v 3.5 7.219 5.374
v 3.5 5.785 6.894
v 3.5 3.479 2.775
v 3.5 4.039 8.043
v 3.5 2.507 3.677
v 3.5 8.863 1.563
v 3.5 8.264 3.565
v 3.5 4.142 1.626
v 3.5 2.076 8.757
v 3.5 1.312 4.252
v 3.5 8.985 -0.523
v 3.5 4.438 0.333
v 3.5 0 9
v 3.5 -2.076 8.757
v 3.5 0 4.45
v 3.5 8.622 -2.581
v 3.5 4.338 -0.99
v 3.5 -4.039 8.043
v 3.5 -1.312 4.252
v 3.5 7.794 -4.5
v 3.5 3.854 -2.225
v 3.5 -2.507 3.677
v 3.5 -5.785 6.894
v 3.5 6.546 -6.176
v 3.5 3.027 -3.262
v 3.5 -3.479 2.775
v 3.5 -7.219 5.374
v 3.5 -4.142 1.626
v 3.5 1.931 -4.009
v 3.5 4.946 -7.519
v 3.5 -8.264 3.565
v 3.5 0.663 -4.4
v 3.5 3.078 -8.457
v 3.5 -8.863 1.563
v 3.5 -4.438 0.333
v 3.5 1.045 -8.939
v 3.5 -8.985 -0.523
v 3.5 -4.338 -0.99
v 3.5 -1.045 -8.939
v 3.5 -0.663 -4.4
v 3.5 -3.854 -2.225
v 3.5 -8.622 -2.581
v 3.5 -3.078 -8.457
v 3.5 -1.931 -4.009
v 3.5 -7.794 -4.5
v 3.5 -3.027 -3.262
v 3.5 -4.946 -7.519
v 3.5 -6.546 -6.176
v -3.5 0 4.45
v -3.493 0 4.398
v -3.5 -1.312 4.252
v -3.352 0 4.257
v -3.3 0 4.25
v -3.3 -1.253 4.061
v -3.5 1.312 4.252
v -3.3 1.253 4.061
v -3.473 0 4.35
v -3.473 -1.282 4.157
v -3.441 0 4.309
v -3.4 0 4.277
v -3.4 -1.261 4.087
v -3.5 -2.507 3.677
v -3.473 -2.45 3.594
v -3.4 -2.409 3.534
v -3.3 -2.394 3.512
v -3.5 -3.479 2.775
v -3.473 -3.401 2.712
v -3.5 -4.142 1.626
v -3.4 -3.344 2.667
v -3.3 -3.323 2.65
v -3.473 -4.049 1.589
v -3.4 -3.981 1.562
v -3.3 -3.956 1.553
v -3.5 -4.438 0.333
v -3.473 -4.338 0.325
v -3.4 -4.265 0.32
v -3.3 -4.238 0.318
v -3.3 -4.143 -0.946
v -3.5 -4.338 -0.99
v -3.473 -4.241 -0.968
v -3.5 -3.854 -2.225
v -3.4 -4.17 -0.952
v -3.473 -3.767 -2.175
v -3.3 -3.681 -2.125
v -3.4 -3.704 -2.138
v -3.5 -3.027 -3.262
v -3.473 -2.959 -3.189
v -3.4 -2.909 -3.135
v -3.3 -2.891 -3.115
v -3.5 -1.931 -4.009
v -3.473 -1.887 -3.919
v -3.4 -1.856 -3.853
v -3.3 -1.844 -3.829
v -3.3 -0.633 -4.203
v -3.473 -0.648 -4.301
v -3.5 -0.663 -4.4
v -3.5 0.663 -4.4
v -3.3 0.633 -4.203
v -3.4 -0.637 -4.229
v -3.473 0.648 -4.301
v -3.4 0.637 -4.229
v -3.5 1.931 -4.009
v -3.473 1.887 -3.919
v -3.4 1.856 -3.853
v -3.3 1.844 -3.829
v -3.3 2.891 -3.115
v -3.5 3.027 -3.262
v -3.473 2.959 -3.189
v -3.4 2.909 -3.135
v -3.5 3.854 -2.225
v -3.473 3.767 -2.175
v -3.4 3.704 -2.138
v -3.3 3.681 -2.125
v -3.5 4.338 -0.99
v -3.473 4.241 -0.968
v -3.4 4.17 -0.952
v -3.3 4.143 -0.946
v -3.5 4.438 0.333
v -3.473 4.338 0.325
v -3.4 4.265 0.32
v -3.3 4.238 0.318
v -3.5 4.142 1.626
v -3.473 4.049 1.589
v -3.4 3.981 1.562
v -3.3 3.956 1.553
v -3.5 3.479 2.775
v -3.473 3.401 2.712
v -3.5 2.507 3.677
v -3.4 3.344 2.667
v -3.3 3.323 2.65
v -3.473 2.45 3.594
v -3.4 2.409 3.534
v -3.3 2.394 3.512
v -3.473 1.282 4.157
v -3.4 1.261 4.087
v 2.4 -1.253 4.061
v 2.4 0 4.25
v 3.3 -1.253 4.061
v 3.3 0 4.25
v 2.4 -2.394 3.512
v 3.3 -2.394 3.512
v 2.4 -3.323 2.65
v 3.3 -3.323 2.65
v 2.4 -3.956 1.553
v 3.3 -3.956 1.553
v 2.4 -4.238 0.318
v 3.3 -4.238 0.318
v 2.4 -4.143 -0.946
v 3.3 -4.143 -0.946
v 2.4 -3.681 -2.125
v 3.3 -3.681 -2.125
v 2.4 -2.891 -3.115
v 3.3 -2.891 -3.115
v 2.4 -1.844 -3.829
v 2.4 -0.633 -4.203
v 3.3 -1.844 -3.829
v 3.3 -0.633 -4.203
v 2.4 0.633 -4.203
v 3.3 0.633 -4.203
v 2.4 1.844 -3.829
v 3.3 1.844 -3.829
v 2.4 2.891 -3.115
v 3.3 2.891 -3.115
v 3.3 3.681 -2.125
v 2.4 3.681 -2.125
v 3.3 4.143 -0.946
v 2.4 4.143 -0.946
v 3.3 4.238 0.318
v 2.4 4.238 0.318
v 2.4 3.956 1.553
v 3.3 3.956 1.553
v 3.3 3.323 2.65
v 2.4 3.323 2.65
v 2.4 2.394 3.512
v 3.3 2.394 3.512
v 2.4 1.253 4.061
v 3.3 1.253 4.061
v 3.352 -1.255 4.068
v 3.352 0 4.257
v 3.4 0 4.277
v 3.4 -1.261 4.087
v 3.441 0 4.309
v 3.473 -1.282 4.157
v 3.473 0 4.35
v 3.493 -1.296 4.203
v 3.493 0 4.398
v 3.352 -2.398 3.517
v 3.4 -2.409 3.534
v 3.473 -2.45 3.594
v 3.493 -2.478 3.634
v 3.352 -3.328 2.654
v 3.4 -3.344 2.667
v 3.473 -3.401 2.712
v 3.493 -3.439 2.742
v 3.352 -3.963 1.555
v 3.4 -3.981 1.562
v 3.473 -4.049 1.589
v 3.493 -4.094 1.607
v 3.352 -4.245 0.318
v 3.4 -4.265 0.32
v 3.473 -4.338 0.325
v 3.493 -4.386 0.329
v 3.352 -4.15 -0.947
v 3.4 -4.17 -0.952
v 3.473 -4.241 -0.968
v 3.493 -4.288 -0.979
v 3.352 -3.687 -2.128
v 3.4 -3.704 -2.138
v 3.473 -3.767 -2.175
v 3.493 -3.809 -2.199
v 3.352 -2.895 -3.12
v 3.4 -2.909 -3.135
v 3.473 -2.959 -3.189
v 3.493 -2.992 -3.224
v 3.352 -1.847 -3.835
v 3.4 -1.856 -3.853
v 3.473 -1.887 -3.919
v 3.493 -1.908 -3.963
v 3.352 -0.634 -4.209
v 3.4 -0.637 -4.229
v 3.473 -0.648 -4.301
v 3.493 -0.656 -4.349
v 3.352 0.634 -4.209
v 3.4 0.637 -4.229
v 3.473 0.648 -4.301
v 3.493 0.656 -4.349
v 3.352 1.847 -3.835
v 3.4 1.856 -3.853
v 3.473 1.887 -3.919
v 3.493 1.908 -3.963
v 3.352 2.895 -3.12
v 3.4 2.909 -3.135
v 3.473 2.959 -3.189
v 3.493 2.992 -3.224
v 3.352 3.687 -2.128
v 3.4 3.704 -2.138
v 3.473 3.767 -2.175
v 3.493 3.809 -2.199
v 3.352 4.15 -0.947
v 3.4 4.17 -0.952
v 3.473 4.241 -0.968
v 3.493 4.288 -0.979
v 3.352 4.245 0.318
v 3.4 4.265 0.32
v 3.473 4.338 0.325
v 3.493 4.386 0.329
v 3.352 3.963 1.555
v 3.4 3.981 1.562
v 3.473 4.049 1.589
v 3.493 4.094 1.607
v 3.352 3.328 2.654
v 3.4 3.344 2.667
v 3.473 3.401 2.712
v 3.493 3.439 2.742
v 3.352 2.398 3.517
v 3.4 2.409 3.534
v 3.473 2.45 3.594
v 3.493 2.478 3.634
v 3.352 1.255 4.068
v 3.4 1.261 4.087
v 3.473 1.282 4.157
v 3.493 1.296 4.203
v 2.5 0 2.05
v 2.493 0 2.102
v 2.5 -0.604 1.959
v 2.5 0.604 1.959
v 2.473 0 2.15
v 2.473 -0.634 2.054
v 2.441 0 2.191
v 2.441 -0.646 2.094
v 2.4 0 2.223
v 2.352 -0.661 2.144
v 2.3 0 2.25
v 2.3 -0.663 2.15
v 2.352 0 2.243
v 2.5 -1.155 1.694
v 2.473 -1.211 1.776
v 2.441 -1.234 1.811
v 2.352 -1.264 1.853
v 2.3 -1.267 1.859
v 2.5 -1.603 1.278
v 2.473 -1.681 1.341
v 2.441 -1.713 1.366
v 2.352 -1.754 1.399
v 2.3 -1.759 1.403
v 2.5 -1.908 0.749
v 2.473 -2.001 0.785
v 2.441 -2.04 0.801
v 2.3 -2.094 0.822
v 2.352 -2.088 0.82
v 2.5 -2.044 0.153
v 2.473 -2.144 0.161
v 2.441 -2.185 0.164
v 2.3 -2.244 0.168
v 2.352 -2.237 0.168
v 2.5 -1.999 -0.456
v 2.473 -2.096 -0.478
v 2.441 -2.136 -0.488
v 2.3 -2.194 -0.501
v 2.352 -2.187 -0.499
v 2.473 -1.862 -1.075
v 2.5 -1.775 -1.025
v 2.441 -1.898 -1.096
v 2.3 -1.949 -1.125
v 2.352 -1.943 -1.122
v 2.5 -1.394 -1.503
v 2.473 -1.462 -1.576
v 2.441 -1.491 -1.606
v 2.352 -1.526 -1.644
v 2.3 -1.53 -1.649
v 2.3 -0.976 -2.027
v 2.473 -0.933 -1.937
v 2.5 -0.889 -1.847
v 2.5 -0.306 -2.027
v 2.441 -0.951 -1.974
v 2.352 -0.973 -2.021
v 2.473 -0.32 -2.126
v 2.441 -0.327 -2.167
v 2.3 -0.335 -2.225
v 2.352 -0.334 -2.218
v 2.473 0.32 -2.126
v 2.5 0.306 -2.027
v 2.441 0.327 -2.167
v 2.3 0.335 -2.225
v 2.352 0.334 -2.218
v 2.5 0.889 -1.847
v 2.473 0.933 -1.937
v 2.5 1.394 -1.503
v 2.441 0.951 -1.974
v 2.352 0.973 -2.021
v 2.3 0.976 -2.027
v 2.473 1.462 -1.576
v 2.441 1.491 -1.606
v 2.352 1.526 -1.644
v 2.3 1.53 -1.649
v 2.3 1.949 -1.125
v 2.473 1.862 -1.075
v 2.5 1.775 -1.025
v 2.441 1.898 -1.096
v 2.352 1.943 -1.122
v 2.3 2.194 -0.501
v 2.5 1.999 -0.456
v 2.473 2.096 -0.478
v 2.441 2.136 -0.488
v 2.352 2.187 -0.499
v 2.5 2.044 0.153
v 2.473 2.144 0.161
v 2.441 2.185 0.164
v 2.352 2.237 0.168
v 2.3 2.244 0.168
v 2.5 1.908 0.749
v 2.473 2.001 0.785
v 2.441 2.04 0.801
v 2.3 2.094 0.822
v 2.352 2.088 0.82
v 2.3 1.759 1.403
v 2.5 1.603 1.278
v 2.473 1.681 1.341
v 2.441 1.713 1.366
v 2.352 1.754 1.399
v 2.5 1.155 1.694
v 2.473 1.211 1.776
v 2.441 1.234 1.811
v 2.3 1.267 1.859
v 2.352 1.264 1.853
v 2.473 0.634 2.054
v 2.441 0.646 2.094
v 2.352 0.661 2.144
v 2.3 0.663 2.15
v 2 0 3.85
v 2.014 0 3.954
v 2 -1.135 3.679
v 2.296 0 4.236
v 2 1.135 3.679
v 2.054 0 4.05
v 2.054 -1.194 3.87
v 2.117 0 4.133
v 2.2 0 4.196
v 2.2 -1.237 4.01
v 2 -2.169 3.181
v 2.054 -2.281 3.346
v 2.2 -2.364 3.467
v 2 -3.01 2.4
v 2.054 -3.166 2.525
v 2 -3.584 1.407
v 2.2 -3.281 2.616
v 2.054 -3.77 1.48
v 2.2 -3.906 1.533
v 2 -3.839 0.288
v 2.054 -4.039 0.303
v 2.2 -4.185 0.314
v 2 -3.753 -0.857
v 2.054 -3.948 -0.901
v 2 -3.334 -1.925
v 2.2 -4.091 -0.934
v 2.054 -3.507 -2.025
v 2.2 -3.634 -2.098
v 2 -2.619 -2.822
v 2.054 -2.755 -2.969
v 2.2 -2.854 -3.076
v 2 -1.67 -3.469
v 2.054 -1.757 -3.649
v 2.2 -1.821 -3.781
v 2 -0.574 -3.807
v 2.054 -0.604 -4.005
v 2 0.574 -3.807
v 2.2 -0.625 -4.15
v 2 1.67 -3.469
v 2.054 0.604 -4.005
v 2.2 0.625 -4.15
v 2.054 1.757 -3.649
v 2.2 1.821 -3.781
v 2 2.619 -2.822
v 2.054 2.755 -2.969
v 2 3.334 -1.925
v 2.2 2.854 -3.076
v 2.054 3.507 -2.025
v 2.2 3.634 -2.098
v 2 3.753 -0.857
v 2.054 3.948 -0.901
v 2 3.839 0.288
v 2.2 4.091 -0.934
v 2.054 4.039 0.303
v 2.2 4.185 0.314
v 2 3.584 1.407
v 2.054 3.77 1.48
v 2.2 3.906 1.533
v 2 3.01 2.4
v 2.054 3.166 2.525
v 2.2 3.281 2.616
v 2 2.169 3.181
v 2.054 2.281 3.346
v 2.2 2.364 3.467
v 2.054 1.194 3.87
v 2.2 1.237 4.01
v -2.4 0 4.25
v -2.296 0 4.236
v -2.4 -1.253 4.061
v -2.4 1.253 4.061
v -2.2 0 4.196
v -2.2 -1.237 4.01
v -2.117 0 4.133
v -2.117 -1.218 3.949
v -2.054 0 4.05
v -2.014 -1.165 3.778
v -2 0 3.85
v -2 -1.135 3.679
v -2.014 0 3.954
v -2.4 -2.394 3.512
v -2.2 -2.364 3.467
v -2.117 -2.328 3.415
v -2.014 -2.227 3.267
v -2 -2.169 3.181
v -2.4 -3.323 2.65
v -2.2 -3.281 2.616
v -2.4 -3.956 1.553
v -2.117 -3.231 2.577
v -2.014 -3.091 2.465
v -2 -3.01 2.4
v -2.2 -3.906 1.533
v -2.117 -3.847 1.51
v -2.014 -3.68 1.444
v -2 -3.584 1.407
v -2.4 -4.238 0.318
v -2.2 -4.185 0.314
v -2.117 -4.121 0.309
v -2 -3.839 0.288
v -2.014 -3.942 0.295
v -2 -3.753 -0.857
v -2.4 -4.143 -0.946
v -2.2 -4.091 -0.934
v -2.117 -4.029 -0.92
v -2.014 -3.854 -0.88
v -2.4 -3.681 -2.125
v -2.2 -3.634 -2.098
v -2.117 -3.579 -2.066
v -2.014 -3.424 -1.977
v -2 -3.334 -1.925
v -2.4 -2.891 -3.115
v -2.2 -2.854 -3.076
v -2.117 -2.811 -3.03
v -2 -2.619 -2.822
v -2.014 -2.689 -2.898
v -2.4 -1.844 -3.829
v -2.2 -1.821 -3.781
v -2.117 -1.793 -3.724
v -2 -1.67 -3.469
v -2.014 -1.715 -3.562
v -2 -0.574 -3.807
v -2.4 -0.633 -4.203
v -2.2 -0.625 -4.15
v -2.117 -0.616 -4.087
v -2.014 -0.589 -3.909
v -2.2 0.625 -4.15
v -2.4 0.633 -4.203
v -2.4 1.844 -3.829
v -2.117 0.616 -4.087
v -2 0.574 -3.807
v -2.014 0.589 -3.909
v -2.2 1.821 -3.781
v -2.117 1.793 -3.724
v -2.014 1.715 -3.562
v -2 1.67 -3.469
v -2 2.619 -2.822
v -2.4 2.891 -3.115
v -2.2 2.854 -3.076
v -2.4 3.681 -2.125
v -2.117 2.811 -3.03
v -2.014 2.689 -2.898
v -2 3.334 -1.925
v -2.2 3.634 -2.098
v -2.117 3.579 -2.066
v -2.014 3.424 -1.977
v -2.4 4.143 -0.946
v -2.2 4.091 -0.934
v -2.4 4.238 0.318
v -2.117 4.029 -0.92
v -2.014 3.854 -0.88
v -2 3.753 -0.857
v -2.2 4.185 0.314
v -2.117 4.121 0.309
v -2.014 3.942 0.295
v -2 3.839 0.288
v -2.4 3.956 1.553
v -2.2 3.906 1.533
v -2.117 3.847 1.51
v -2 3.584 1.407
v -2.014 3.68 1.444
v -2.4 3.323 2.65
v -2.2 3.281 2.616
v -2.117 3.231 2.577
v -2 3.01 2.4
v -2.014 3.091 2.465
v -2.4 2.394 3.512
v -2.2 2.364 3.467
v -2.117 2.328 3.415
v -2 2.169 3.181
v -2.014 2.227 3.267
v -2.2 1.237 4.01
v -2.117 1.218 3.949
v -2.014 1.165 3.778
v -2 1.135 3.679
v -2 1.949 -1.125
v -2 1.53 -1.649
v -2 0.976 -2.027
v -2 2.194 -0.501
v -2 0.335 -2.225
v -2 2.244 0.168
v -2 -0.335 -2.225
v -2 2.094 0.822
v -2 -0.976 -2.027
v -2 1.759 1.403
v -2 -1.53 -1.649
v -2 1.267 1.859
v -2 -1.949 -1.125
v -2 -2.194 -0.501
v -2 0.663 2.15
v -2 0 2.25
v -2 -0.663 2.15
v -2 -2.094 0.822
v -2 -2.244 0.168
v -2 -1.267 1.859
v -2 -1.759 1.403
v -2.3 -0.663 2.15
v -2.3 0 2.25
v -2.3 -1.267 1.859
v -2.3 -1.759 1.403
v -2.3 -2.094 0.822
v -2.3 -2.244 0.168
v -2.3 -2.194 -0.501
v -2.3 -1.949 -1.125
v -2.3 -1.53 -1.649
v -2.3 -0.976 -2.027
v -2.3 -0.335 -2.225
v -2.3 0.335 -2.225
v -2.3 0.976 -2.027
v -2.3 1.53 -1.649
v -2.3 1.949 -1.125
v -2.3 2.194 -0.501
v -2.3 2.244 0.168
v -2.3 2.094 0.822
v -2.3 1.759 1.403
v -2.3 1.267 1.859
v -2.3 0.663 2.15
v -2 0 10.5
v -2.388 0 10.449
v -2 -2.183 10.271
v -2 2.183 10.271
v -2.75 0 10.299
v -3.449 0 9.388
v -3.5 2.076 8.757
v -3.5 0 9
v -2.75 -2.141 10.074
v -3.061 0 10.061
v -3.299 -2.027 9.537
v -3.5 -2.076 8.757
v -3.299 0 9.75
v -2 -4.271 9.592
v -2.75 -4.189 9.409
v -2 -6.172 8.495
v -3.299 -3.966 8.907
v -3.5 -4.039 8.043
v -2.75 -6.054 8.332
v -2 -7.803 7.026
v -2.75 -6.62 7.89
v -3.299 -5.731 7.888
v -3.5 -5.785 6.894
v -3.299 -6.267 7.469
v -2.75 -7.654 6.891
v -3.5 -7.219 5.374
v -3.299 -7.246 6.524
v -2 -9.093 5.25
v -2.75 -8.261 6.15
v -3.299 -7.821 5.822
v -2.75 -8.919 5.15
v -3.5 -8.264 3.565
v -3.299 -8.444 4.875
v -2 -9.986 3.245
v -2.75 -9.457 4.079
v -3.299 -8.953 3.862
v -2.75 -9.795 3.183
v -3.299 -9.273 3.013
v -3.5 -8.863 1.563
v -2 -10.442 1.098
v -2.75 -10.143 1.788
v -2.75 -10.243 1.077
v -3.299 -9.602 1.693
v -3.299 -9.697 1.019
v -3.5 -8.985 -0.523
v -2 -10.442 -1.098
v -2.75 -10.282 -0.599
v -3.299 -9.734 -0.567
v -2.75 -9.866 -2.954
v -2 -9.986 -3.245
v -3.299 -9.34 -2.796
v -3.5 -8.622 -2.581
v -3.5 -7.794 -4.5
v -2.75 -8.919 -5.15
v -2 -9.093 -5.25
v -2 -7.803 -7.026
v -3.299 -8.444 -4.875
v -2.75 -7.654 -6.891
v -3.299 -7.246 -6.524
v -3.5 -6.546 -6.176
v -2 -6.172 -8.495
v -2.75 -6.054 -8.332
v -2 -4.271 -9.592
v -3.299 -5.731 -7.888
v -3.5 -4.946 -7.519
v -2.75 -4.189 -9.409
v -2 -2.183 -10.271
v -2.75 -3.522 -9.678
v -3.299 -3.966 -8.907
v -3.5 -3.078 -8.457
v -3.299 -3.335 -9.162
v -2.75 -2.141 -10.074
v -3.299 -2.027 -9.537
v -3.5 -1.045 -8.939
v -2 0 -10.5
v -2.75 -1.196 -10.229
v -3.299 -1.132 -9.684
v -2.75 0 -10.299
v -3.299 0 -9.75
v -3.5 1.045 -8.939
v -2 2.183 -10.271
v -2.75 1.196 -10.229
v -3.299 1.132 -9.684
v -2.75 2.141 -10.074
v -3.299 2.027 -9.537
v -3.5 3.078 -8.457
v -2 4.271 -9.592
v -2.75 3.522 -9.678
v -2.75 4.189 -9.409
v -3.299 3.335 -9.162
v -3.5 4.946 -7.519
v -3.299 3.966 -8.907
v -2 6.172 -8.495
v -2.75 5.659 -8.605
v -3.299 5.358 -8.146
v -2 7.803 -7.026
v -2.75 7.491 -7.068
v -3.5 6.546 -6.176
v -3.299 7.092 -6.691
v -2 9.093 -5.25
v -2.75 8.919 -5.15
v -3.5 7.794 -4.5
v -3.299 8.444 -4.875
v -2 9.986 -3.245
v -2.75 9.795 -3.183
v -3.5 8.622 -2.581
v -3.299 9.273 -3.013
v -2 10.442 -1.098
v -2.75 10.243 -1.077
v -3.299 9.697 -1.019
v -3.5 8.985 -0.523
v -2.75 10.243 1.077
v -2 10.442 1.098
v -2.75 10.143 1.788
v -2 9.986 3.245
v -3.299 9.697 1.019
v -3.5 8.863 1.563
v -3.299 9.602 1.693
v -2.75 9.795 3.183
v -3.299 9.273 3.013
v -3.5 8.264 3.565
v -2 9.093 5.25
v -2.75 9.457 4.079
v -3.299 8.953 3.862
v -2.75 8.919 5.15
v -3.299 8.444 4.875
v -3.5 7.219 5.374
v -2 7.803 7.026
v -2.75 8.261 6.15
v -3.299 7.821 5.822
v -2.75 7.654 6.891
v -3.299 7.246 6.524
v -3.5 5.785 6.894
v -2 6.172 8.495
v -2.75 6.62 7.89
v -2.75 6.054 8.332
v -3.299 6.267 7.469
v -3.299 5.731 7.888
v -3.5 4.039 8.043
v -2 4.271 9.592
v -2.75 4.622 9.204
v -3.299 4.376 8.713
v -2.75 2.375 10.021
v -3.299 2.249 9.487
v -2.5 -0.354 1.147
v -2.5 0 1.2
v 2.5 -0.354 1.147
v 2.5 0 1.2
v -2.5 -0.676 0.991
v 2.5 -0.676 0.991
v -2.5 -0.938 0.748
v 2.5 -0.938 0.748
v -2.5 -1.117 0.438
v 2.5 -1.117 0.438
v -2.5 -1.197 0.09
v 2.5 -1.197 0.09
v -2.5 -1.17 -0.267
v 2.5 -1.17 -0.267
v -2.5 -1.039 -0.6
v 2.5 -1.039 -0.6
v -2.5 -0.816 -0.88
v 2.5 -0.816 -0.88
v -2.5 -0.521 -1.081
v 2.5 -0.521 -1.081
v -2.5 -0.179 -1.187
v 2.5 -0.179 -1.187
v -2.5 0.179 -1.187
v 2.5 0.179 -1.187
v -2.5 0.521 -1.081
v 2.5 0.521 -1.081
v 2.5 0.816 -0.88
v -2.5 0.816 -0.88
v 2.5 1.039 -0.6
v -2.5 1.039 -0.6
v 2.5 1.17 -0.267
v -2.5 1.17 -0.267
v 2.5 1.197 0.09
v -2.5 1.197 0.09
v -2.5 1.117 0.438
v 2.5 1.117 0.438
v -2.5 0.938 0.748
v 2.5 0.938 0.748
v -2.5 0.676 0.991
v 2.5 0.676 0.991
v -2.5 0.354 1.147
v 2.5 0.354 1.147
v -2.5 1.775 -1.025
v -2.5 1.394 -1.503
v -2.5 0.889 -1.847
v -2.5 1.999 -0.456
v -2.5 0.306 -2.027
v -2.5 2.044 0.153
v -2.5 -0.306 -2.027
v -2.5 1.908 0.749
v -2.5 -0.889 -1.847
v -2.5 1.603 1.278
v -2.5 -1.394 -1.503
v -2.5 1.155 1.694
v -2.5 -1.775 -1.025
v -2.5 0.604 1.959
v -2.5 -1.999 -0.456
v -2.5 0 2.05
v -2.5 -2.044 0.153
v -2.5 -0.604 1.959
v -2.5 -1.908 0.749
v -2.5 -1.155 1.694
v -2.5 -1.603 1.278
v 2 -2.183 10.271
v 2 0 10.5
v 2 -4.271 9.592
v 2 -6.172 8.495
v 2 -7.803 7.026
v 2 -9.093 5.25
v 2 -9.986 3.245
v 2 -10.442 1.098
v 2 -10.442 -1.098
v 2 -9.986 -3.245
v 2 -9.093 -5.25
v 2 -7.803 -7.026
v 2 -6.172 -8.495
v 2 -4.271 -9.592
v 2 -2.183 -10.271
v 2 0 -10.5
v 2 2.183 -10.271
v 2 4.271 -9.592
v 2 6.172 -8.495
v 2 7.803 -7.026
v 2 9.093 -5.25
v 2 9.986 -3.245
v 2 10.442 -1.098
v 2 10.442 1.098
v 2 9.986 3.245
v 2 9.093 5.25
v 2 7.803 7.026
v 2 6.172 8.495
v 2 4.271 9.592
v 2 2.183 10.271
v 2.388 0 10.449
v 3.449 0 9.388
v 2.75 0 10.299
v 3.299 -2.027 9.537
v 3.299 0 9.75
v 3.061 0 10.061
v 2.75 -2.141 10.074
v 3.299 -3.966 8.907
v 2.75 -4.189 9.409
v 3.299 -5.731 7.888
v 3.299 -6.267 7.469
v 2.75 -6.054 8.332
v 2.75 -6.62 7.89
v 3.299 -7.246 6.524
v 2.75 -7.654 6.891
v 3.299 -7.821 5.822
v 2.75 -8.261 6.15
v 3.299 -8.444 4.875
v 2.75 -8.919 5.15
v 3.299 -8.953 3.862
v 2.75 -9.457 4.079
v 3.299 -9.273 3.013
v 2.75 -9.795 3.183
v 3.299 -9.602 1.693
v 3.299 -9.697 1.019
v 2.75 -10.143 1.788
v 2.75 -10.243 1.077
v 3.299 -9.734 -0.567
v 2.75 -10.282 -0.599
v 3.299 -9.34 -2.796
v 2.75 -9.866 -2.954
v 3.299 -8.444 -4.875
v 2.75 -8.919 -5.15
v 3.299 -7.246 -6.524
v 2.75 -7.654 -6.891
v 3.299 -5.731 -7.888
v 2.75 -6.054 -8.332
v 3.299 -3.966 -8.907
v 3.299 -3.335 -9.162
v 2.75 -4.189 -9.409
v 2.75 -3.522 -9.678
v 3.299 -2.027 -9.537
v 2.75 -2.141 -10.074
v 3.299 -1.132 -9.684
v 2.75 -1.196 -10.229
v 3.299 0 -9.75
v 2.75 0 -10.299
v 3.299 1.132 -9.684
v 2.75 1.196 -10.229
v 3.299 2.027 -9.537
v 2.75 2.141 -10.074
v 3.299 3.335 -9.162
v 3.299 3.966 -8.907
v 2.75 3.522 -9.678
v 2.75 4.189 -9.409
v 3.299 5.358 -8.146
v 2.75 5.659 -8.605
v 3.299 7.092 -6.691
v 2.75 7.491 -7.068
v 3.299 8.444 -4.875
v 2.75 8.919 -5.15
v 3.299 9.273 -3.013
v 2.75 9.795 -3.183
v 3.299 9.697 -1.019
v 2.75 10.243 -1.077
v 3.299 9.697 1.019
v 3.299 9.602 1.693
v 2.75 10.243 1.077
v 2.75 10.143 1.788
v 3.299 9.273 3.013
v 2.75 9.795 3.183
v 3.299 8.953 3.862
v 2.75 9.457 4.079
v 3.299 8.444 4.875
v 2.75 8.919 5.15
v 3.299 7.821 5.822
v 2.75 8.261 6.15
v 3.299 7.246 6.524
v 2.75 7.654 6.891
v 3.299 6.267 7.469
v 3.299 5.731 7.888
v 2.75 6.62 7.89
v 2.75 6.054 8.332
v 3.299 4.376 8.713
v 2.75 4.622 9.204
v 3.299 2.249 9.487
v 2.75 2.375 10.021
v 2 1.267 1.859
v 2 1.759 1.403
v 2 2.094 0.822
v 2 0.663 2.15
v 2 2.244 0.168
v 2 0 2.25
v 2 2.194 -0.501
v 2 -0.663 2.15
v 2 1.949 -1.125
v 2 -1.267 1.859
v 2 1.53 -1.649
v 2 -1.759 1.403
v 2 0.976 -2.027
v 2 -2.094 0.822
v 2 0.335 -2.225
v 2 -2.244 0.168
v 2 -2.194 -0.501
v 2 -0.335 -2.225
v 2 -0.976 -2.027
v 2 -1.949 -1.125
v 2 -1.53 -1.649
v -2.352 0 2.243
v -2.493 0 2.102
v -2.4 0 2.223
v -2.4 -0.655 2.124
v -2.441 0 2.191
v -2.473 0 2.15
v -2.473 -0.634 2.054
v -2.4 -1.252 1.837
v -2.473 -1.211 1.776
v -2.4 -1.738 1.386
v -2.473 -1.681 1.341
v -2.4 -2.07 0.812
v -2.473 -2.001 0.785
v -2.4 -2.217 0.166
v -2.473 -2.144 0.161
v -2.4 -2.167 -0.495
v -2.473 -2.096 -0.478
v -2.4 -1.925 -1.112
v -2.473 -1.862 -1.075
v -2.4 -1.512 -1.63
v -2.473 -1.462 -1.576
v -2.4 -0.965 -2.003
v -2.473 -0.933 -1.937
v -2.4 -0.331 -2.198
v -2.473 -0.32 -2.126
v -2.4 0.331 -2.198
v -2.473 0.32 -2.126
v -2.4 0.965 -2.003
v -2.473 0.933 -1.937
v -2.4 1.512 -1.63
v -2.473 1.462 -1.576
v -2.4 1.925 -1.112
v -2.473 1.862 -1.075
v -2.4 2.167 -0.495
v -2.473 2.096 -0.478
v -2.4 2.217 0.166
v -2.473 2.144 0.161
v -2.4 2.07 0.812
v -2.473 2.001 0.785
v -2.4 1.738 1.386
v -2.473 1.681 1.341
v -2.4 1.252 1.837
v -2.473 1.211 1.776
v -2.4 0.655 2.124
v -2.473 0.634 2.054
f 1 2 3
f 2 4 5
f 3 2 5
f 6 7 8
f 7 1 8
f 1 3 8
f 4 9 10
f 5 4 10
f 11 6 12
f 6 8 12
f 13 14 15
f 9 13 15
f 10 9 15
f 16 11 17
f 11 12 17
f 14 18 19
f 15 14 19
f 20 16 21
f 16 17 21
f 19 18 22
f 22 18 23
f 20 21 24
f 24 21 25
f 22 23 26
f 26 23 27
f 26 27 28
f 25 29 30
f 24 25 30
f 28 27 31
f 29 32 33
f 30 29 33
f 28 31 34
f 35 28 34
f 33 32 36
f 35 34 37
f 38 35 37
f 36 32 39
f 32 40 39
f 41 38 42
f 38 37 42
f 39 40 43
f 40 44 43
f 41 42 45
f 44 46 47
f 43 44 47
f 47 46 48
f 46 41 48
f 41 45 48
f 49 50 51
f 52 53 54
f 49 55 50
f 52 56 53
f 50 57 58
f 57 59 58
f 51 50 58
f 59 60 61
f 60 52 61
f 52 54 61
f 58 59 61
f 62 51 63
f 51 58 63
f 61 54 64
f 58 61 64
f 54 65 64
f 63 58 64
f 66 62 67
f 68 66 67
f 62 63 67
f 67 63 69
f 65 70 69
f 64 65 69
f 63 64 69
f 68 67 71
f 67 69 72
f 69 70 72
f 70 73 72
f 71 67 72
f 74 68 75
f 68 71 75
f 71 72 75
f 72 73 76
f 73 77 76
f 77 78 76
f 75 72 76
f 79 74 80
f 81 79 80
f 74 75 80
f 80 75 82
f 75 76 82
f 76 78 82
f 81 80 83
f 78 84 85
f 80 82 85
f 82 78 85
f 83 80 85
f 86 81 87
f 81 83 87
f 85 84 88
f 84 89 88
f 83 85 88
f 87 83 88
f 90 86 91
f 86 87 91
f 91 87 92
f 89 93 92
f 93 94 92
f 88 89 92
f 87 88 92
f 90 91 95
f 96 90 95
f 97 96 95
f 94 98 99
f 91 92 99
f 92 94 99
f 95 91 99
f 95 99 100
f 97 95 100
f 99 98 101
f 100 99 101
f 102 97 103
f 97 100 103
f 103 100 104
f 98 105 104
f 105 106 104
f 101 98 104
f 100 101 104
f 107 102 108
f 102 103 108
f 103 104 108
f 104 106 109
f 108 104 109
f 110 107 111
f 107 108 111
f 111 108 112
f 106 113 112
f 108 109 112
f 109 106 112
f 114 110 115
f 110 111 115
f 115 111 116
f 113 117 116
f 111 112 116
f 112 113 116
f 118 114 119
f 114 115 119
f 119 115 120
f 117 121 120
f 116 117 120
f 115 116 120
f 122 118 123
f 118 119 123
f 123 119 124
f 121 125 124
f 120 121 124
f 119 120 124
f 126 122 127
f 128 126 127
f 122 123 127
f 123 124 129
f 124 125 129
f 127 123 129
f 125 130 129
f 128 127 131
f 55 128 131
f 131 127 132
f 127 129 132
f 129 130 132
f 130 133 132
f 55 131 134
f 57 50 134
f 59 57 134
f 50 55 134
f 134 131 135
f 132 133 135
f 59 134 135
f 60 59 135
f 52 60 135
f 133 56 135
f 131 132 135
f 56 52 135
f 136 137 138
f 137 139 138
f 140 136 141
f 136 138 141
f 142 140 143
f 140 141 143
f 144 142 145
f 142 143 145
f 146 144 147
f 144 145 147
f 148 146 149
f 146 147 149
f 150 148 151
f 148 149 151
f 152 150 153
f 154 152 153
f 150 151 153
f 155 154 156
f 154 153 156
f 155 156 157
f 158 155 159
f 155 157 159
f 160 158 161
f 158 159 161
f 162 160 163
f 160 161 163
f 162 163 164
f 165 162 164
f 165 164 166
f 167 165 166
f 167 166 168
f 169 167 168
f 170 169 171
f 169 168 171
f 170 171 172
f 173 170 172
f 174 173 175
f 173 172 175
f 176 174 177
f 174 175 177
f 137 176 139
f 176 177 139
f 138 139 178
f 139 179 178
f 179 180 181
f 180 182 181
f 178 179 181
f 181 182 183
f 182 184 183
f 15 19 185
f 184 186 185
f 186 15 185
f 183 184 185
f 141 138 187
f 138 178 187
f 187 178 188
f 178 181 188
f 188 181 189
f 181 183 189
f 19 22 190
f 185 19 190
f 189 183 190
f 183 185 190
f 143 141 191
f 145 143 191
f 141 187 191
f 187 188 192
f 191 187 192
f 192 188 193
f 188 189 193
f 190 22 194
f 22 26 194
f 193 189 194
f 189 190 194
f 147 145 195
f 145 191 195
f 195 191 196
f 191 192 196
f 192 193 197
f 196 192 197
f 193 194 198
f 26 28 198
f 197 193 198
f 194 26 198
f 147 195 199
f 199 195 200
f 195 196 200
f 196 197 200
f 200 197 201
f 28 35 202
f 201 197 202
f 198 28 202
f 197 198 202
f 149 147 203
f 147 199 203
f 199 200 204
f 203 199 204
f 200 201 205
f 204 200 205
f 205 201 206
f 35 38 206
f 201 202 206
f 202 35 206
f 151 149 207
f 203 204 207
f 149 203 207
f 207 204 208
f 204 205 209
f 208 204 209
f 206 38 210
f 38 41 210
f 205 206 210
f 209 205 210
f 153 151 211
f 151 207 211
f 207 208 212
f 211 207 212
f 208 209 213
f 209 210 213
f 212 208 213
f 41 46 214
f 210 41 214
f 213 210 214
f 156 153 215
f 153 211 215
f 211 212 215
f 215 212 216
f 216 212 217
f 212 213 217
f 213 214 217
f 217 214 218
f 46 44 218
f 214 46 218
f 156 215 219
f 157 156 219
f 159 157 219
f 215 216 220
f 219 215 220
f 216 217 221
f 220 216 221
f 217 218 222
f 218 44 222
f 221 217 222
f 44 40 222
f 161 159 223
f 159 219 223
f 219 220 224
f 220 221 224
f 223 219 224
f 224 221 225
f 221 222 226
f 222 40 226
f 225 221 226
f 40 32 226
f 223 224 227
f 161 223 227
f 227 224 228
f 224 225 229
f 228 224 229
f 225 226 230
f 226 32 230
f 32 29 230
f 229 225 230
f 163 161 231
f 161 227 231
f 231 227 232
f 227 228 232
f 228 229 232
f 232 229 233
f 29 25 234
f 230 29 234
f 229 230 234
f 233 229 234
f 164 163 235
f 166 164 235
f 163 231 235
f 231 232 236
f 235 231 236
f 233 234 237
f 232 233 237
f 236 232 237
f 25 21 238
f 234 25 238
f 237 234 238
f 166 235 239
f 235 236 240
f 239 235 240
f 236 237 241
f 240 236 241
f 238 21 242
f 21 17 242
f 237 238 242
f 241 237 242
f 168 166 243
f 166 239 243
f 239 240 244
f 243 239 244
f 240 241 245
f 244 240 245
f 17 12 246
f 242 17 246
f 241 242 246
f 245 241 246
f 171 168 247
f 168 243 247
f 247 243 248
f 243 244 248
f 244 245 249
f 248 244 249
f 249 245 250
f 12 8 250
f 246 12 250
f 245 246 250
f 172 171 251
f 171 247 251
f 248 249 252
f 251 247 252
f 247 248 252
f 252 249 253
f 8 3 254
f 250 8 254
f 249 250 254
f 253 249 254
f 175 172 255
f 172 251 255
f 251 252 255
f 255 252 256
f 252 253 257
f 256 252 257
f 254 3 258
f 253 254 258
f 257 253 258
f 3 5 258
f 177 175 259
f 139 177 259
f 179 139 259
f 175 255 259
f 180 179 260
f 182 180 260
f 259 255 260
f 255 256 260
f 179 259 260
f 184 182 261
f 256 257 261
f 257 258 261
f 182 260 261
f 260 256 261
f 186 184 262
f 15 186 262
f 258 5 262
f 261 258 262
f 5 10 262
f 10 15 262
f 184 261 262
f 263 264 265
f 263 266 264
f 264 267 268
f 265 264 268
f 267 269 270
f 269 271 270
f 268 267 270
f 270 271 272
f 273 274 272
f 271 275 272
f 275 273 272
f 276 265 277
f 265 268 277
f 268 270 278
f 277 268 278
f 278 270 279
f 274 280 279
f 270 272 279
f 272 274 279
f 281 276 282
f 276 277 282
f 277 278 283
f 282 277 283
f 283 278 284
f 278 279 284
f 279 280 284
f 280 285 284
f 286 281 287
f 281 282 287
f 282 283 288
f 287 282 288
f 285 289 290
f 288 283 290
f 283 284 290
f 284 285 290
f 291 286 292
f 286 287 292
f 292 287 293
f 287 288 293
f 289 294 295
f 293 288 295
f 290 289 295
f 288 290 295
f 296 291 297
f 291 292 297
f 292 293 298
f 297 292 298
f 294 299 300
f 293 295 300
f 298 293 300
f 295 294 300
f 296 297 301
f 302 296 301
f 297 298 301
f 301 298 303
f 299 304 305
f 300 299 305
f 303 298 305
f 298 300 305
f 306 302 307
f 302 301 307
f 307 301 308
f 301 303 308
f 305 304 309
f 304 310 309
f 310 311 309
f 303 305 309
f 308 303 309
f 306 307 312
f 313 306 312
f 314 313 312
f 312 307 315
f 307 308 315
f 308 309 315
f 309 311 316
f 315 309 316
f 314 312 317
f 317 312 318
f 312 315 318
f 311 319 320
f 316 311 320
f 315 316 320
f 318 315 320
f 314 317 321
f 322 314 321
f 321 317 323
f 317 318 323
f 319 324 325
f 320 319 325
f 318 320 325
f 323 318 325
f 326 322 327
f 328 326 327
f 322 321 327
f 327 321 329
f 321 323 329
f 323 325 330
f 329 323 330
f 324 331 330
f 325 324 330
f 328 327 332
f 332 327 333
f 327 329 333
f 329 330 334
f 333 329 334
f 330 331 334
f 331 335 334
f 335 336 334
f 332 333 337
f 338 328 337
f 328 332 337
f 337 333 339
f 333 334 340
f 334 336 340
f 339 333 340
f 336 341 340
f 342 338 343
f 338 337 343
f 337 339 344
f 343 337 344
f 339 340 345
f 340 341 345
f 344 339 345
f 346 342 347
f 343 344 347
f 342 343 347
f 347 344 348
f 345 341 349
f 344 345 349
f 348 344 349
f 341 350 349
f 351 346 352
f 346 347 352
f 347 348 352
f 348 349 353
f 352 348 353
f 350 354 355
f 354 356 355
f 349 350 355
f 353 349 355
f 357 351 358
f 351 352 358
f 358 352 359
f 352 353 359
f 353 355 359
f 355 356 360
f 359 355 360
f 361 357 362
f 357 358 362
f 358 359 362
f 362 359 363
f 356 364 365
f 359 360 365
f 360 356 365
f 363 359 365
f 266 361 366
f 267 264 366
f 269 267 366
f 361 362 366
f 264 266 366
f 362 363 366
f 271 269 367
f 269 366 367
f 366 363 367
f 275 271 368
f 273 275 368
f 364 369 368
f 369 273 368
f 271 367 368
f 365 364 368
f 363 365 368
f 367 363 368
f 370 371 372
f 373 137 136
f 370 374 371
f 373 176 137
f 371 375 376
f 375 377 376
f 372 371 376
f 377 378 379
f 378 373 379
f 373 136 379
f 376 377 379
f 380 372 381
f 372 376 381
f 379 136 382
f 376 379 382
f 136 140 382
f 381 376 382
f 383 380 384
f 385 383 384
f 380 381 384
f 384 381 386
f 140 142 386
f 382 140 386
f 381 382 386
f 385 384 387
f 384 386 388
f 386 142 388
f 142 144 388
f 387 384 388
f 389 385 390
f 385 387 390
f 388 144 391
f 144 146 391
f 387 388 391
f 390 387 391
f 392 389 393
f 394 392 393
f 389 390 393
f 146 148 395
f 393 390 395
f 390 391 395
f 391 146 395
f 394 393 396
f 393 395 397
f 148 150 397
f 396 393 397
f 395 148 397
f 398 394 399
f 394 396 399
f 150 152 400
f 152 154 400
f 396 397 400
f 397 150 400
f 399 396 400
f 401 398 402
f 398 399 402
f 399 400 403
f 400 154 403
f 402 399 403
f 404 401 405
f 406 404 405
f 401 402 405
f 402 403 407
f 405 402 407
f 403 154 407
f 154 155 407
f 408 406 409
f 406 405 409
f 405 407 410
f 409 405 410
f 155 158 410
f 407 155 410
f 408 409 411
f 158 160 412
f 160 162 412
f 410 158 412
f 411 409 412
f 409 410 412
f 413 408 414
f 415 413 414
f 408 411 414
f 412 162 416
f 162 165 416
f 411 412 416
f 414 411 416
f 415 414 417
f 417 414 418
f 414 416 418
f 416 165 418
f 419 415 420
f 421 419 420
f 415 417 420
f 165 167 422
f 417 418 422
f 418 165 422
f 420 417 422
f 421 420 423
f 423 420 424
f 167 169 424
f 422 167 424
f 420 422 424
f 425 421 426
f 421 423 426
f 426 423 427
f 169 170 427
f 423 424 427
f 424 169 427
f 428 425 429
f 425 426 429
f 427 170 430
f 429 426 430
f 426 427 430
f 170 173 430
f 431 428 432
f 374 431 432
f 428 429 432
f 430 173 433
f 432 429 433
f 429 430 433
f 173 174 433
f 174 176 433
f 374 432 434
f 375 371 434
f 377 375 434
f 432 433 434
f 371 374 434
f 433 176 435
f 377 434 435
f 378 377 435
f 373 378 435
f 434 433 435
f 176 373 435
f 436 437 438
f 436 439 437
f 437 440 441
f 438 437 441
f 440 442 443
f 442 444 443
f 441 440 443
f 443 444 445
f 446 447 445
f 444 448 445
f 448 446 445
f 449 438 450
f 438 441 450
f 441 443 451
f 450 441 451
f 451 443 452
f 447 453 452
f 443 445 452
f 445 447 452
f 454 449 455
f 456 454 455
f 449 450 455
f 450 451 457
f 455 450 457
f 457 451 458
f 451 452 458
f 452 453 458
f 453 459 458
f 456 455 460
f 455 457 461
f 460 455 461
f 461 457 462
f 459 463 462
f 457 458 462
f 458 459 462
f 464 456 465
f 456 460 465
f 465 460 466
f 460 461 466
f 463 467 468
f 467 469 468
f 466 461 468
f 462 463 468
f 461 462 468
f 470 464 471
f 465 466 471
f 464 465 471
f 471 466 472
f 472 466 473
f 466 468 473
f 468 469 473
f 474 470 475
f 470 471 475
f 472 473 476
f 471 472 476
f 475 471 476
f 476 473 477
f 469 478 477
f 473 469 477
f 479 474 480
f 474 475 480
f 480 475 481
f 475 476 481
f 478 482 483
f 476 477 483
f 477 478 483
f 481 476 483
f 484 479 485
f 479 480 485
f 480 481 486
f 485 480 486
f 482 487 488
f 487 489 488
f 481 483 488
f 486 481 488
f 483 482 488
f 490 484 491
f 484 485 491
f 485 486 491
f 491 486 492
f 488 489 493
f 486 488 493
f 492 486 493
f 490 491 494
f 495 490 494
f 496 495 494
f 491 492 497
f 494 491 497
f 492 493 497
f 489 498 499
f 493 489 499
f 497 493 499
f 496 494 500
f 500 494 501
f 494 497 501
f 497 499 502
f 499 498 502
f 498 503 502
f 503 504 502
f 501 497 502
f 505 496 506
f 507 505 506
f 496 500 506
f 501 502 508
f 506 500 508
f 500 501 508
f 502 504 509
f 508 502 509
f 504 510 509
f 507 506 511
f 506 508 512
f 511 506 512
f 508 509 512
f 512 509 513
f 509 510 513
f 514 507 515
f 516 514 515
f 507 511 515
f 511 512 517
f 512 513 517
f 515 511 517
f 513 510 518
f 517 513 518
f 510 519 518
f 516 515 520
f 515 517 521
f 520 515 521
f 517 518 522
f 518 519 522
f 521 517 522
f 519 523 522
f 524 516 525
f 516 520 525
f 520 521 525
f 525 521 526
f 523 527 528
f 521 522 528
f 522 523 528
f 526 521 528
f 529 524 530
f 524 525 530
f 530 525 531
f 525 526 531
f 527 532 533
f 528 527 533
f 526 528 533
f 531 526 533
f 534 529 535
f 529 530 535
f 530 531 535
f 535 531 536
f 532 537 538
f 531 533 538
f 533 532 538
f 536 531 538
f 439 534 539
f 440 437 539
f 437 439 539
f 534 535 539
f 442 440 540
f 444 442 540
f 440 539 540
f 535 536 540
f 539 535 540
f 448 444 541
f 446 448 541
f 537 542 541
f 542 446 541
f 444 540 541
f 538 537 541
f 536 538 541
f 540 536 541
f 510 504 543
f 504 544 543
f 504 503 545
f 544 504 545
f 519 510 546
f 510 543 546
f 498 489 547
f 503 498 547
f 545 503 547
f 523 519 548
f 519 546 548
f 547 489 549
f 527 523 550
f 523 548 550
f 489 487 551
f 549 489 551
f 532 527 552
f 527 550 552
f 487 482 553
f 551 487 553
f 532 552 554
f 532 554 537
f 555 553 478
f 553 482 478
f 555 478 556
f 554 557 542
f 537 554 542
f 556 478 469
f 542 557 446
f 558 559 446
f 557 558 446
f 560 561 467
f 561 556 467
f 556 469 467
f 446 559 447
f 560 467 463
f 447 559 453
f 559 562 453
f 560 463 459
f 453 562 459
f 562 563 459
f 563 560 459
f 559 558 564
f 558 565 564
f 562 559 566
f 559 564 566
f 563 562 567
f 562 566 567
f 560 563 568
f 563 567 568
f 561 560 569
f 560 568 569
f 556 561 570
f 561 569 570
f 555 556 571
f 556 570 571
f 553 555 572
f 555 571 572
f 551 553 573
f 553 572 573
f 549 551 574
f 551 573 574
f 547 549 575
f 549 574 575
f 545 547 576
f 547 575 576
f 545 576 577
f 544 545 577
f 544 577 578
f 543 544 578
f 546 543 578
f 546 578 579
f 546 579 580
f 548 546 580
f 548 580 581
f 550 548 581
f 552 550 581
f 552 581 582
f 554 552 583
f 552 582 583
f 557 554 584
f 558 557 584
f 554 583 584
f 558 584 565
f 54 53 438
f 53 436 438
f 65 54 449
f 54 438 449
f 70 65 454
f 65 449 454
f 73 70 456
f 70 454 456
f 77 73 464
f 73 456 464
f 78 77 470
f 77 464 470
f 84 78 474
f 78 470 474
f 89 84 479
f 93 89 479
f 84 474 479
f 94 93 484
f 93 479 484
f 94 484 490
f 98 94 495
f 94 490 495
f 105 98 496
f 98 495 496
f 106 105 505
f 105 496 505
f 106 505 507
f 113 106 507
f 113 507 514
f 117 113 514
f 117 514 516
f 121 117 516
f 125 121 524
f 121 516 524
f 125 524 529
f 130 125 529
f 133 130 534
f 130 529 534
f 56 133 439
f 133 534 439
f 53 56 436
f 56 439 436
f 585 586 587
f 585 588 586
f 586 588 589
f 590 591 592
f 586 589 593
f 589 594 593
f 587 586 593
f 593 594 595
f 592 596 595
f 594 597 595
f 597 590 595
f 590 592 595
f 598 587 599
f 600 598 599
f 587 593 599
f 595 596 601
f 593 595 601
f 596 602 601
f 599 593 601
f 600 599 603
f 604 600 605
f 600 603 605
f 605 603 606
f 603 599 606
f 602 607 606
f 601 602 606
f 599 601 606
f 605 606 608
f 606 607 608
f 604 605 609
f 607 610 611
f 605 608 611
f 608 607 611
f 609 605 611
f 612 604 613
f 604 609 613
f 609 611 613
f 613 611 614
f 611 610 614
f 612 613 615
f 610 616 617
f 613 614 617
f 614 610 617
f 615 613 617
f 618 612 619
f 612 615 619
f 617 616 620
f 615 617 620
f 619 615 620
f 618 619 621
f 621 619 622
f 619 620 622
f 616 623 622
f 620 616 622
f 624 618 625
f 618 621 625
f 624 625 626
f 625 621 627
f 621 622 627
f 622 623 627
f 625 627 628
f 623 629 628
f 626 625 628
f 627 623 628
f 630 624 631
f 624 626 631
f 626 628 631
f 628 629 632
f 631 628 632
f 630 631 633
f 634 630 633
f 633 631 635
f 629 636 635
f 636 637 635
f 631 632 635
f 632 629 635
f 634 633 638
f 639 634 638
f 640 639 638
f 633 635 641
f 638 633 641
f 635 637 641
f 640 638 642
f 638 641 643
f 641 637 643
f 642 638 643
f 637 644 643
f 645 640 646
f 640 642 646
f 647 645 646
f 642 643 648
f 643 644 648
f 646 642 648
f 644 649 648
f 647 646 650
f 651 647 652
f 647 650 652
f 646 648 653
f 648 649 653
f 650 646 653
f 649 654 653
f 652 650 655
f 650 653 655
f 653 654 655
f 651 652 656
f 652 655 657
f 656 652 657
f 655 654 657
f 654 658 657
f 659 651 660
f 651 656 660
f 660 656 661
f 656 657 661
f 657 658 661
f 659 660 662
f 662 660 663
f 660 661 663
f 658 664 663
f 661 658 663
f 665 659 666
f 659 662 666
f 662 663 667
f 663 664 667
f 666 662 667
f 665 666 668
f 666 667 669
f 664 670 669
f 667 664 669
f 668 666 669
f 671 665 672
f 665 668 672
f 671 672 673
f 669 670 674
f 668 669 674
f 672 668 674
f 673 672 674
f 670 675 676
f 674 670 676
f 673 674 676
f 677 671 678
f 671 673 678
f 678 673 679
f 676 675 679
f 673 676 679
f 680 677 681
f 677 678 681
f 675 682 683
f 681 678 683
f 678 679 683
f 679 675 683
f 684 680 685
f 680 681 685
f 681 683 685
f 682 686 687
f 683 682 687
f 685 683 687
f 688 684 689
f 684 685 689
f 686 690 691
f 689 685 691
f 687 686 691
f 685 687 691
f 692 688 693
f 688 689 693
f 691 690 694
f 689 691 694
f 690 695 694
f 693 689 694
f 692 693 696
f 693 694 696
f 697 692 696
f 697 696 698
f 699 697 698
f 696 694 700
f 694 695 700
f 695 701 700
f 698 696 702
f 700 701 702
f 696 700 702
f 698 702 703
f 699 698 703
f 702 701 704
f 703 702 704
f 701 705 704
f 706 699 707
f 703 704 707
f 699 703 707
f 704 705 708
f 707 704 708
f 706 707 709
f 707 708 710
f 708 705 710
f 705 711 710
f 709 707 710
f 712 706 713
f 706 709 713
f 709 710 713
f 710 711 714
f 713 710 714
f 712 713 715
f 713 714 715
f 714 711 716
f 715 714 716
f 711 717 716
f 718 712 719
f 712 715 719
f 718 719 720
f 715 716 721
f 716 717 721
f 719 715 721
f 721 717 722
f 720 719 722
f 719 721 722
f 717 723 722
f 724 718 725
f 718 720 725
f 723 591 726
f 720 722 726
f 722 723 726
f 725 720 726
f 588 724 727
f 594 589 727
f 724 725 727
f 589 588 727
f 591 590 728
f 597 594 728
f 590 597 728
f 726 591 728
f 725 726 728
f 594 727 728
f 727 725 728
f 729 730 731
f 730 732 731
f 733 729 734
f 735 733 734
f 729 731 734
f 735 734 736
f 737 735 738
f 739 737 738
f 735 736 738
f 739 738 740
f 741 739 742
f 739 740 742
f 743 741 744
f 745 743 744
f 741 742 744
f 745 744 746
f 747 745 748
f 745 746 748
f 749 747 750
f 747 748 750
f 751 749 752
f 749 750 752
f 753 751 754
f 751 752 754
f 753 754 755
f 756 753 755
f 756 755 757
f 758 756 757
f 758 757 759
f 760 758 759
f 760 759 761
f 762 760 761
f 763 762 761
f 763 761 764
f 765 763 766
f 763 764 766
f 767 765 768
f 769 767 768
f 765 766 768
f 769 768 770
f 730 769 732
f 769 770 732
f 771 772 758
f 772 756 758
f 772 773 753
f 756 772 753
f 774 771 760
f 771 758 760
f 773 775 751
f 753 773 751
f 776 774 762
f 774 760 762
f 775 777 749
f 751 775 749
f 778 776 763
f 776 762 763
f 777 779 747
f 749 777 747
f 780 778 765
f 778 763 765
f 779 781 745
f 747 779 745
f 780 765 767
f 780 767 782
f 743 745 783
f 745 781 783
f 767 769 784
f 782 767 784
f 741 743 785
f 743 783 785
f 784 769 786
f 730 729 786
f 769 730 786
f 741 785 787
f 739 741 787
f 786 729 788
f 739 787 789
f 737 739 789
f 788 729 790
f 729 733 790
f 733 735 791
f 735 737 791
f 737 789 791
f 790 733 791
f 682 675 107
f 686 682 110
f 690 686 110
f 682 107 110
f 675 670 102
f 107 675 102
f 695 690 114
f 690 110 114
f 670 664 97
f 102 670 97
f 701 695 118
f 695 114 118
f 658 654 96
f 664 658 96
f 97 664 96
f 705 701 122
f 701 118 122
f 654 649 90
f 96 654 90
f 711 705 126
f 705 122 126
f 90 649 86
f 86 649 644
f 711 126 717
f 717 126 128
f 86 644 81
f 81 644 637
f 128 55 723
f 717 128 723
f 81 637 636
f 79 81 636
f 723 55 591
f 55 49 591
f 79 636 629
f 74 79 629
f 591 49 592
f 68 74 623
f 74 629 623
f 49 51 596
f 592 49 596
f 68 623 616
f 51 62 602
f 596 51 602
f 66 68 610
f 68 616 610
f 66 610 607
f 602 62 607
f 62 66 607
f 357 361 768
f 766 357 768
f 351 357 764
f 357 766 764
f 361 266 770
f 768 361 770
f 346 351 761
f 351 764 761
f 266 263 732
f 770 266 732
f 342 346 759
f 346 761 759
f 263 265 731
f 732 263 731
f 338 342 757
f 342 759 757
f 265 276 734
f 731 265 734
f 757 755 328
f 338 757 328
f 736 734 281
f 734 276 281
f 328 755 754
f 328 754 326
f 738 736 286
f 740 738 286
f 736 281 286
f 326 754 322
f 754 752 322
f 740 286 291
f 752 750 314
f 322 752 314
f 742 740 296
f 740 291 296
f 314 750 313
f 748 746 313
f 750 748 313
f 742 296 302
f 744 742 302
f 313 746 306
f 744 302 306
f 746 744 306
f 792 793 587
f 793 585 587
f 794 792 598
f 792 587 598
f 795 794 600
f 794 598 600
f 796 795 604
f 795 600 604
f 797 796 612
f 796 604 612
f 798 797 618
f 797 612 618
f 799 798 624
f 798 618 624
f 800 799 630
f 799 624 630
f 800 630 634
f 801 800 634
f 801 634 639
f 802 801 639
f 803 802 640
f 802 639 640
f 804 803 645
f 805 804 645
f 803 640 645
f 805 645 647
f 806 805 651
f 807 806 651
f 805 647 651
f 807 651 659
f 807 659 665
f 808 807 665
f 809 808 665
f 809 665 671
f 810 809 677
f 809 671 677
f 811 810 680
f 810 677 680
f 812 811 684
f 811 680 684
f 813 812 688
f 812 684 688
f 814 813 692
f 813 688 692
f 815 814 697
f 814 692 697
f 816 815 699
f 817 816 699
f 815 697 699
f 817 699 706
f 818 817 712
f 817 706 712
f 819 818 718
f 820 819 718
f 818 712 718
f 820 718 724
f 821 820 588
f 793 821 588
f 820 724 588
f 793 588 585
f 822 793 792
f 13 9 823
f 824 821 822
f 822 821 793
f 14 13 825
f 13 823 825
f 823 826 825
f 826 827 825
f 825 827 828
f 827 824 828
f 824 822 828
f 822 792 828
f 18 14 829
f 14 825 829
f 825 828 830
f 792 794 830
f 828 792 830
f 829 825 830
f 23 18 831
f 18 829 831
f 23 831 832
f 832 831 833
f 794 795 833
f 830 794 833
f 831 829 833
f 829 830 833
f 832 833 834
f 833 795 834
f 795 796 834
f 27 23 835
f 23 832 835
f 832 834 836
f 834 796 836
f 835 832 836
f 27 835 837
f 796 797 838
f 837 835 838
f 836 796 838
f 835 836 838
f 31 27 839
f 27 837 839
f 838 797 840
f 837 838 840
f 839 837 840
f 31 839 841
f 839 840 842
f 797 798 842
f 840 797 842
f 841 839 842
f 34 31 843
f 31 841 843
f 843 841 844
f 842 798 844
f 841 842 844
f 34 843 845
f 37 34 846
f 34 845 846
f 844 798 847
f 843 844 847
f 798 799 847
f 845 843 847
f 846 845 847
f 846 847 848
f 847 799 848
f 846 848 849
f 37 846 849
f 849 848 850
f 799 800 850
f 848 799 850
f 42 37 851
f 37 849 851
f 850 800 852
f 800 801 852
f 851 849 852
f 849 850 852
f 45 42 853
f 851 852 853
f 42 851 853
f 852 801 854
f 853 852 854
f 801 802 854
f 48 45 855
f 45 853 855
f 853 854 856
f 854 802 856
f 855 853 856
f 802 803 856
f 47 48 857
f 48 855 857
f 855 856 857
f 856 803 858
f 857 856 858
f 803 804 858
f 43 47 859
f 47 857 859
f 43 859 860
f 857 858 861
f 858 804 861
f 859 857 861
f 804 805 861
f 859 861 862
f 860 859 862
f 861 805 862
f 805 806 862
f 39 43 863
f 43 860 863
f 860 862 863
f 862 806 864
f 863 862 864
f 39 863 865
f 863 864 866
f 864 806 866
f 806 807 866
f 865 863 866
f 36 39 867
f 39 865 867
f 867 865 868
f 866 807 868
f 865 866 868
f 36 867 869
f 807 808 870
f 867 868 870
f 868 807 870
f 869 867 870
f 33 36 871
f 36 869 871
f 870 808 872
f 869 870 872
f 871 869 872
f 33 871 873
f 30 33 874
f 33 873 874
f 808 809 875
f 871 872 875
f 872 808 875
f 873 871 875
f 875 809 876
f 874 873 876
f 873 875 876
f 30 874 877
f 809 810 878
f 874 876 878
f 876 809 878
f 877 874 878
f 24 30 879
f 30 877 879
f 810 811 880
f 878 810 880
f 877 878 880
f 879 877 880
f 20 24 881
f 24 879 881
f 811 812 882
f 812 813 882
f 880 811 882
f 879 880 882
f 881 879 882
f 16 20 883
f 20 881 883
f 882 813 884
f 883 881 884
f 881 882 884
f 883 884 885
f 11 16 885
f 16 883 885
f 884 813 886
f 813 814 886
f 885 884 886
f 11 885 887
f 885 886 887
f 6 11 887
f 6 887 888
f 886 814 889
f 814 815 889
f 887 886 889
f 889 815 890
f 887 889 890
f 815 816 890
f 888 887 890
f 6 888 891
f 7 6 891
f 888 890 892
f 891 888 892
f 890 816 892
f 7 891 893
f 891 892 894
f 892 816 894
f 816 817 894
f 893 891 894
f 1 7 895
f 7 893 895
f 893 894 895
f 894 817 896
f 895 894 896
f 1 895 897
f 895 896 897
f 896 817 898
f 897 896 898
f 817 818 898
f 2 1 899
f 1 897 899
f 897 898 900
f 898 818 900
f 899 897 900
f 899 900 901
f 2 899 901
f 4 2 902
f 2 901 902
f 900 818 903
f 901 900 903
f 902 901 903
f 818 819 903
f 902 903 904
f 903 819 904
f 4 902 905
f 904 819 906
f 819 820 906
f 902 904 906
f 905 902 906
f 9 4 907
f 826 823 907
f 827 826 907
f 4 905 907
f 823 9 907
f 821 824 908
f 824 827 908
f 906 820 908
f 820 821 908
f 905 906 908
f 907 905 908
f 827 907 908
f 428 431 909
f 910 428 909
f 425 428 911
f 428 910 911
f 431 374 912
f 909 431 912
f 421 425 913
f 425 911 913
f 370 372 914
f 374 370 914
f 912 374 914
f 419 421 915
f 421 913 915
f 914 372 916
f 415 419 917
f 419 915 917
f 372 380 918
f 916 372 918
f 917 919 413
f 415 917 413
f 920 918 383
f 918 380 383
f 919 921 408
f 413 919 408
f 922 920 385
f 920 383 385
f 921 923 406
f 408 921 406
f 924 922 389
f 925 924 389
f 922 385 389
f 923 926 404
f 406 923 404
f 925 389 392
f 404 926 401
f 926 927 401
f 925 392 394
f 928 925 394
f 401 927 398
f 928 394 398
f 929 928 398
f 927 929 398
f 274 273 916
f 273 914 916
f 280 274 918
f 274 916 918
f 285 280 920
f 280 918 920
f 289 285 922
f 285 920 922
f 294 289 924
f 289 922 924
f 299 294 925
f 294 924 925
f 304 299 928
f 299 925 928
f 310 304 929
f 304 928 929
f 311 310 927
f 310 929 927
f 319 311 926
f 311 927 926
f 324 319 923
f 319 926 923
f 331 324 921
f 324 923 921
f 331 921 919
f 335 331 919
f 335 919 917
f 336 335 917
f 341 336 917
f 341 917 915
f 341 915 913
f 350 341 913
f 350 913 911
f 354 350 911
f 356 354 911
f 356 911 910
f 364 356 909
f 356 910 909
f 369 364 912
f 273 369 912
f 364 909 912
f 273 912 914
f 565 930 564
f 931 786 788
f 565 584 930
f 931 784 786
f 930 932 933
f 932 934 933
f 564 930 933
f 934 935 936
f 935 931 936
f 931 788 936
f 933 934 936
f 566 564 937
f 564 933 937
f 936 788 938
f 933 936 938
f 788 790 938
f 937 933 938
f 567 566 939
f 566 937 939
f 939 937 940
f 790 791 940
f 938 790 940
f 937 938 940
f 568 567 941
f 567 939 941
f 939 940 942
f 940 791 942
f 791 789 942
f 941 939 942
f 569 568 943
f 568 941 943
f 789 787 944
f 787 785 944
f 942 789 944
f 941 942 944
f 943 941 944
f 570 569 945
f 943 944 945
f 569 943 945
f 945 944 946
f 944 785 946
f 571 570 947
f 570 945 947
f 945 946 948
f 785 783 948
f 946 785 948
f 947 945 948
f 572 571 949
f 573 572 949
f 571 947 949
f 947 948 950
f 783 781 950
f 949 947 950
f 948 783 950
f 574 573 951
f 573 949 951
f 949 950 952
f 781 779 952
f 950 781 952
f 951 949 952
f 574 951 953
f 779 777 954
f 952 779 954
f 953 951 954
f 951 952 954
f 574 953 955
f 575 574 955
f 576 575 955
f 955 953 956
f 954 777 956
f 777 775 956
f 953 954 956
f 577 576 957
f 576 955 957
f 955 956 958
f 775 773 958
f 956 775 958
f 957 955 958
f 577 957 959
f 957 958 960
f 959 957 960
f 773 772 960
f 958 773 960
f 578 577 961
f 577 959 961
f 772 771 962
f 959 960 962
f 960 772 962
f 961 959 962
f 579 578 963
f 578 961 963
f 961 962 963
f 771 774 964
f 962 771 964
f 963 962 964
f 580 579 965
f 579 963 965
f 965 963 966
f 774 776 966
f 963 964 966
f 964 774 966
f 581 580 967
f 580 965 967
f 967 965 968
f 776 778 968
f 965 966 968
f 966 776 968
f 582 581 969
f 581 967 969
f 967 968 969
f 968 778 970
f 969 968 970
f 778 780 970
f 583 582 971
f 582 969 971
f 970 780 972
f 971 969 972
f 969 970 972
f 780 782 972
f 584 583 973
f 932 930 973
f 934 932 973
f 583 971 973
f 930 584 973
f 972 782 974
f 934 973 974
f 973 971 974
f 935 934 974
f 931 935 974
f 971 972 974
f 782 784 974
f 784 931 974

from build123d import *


with BuildPart() as part:
    # Esboço6 → Revolução2 (revolve)
    with BuildSketch(Plane.XY, mode=Mode.PRIVATE) as revolu_o2_sk:
        with BuildLine():
            Line((2.5, 1.2), (2.5, 2.05))
            ThreePointArc((2.5, 2.05), (2.441421356, 2.191421356), (2.3, 2.25))
            Line((2.3, 2.25), (2, 2.25))
            Line((2, 2.25), (2, 3.85))
            ThreePointArc((2, 3.85), (2.117157288, 4.132842712), (2.4, 4.25))
            Line((2.4, 4.25), (3.3, 4.25))
            ThreePointArc((3.3, 4.25), (3.441421356, 4.308578644), (3.5, 4.45))
            Line((3.5, 4.45), (3.5, 9))
            ThreePointArc((3.5, 9), (3.060660172, 10.060660172), (2, 10.5))
            Line((2, 10.5), (-2, 10.5))
            ThreePointArc((-2, 10.5), (-3.060660172, 10.060660172), (-3.5, 9))
            Line((-3.5, 9), (-3.5, 4.45))
            ThreePointArc((-3.5, 4.45), (-3.441421356, 4.308578644), (-3.3, 4.25))
            Line((-3.3, 4.25), (-2.4, 4.25))
            ThreePointArc((-2.4, 4.25), (-2.117157288, 4.132842712), (-2, 3.85))
            Line((-2, 3.85), (-2, 2.25))
            Line((-2, 2.25), (-2.3, 2.25))
            ThreePointArc((-2.3, 2.25), (-2.441421356, 2.191421356), (-2.5, 2.05))
            Line((-2.5, 2.05), (-2.5, 1.2))
            Line((-2.5, 1.2), (2.5, 1.2))
        make_face()
    revolve(revolu_o2_sk.sketch.rotate(Axis((0, 0, 0), (1, 0, 0)), 90), axis=Axis((0, 0, 0), (1, 0, 0)))


solid = part.part
